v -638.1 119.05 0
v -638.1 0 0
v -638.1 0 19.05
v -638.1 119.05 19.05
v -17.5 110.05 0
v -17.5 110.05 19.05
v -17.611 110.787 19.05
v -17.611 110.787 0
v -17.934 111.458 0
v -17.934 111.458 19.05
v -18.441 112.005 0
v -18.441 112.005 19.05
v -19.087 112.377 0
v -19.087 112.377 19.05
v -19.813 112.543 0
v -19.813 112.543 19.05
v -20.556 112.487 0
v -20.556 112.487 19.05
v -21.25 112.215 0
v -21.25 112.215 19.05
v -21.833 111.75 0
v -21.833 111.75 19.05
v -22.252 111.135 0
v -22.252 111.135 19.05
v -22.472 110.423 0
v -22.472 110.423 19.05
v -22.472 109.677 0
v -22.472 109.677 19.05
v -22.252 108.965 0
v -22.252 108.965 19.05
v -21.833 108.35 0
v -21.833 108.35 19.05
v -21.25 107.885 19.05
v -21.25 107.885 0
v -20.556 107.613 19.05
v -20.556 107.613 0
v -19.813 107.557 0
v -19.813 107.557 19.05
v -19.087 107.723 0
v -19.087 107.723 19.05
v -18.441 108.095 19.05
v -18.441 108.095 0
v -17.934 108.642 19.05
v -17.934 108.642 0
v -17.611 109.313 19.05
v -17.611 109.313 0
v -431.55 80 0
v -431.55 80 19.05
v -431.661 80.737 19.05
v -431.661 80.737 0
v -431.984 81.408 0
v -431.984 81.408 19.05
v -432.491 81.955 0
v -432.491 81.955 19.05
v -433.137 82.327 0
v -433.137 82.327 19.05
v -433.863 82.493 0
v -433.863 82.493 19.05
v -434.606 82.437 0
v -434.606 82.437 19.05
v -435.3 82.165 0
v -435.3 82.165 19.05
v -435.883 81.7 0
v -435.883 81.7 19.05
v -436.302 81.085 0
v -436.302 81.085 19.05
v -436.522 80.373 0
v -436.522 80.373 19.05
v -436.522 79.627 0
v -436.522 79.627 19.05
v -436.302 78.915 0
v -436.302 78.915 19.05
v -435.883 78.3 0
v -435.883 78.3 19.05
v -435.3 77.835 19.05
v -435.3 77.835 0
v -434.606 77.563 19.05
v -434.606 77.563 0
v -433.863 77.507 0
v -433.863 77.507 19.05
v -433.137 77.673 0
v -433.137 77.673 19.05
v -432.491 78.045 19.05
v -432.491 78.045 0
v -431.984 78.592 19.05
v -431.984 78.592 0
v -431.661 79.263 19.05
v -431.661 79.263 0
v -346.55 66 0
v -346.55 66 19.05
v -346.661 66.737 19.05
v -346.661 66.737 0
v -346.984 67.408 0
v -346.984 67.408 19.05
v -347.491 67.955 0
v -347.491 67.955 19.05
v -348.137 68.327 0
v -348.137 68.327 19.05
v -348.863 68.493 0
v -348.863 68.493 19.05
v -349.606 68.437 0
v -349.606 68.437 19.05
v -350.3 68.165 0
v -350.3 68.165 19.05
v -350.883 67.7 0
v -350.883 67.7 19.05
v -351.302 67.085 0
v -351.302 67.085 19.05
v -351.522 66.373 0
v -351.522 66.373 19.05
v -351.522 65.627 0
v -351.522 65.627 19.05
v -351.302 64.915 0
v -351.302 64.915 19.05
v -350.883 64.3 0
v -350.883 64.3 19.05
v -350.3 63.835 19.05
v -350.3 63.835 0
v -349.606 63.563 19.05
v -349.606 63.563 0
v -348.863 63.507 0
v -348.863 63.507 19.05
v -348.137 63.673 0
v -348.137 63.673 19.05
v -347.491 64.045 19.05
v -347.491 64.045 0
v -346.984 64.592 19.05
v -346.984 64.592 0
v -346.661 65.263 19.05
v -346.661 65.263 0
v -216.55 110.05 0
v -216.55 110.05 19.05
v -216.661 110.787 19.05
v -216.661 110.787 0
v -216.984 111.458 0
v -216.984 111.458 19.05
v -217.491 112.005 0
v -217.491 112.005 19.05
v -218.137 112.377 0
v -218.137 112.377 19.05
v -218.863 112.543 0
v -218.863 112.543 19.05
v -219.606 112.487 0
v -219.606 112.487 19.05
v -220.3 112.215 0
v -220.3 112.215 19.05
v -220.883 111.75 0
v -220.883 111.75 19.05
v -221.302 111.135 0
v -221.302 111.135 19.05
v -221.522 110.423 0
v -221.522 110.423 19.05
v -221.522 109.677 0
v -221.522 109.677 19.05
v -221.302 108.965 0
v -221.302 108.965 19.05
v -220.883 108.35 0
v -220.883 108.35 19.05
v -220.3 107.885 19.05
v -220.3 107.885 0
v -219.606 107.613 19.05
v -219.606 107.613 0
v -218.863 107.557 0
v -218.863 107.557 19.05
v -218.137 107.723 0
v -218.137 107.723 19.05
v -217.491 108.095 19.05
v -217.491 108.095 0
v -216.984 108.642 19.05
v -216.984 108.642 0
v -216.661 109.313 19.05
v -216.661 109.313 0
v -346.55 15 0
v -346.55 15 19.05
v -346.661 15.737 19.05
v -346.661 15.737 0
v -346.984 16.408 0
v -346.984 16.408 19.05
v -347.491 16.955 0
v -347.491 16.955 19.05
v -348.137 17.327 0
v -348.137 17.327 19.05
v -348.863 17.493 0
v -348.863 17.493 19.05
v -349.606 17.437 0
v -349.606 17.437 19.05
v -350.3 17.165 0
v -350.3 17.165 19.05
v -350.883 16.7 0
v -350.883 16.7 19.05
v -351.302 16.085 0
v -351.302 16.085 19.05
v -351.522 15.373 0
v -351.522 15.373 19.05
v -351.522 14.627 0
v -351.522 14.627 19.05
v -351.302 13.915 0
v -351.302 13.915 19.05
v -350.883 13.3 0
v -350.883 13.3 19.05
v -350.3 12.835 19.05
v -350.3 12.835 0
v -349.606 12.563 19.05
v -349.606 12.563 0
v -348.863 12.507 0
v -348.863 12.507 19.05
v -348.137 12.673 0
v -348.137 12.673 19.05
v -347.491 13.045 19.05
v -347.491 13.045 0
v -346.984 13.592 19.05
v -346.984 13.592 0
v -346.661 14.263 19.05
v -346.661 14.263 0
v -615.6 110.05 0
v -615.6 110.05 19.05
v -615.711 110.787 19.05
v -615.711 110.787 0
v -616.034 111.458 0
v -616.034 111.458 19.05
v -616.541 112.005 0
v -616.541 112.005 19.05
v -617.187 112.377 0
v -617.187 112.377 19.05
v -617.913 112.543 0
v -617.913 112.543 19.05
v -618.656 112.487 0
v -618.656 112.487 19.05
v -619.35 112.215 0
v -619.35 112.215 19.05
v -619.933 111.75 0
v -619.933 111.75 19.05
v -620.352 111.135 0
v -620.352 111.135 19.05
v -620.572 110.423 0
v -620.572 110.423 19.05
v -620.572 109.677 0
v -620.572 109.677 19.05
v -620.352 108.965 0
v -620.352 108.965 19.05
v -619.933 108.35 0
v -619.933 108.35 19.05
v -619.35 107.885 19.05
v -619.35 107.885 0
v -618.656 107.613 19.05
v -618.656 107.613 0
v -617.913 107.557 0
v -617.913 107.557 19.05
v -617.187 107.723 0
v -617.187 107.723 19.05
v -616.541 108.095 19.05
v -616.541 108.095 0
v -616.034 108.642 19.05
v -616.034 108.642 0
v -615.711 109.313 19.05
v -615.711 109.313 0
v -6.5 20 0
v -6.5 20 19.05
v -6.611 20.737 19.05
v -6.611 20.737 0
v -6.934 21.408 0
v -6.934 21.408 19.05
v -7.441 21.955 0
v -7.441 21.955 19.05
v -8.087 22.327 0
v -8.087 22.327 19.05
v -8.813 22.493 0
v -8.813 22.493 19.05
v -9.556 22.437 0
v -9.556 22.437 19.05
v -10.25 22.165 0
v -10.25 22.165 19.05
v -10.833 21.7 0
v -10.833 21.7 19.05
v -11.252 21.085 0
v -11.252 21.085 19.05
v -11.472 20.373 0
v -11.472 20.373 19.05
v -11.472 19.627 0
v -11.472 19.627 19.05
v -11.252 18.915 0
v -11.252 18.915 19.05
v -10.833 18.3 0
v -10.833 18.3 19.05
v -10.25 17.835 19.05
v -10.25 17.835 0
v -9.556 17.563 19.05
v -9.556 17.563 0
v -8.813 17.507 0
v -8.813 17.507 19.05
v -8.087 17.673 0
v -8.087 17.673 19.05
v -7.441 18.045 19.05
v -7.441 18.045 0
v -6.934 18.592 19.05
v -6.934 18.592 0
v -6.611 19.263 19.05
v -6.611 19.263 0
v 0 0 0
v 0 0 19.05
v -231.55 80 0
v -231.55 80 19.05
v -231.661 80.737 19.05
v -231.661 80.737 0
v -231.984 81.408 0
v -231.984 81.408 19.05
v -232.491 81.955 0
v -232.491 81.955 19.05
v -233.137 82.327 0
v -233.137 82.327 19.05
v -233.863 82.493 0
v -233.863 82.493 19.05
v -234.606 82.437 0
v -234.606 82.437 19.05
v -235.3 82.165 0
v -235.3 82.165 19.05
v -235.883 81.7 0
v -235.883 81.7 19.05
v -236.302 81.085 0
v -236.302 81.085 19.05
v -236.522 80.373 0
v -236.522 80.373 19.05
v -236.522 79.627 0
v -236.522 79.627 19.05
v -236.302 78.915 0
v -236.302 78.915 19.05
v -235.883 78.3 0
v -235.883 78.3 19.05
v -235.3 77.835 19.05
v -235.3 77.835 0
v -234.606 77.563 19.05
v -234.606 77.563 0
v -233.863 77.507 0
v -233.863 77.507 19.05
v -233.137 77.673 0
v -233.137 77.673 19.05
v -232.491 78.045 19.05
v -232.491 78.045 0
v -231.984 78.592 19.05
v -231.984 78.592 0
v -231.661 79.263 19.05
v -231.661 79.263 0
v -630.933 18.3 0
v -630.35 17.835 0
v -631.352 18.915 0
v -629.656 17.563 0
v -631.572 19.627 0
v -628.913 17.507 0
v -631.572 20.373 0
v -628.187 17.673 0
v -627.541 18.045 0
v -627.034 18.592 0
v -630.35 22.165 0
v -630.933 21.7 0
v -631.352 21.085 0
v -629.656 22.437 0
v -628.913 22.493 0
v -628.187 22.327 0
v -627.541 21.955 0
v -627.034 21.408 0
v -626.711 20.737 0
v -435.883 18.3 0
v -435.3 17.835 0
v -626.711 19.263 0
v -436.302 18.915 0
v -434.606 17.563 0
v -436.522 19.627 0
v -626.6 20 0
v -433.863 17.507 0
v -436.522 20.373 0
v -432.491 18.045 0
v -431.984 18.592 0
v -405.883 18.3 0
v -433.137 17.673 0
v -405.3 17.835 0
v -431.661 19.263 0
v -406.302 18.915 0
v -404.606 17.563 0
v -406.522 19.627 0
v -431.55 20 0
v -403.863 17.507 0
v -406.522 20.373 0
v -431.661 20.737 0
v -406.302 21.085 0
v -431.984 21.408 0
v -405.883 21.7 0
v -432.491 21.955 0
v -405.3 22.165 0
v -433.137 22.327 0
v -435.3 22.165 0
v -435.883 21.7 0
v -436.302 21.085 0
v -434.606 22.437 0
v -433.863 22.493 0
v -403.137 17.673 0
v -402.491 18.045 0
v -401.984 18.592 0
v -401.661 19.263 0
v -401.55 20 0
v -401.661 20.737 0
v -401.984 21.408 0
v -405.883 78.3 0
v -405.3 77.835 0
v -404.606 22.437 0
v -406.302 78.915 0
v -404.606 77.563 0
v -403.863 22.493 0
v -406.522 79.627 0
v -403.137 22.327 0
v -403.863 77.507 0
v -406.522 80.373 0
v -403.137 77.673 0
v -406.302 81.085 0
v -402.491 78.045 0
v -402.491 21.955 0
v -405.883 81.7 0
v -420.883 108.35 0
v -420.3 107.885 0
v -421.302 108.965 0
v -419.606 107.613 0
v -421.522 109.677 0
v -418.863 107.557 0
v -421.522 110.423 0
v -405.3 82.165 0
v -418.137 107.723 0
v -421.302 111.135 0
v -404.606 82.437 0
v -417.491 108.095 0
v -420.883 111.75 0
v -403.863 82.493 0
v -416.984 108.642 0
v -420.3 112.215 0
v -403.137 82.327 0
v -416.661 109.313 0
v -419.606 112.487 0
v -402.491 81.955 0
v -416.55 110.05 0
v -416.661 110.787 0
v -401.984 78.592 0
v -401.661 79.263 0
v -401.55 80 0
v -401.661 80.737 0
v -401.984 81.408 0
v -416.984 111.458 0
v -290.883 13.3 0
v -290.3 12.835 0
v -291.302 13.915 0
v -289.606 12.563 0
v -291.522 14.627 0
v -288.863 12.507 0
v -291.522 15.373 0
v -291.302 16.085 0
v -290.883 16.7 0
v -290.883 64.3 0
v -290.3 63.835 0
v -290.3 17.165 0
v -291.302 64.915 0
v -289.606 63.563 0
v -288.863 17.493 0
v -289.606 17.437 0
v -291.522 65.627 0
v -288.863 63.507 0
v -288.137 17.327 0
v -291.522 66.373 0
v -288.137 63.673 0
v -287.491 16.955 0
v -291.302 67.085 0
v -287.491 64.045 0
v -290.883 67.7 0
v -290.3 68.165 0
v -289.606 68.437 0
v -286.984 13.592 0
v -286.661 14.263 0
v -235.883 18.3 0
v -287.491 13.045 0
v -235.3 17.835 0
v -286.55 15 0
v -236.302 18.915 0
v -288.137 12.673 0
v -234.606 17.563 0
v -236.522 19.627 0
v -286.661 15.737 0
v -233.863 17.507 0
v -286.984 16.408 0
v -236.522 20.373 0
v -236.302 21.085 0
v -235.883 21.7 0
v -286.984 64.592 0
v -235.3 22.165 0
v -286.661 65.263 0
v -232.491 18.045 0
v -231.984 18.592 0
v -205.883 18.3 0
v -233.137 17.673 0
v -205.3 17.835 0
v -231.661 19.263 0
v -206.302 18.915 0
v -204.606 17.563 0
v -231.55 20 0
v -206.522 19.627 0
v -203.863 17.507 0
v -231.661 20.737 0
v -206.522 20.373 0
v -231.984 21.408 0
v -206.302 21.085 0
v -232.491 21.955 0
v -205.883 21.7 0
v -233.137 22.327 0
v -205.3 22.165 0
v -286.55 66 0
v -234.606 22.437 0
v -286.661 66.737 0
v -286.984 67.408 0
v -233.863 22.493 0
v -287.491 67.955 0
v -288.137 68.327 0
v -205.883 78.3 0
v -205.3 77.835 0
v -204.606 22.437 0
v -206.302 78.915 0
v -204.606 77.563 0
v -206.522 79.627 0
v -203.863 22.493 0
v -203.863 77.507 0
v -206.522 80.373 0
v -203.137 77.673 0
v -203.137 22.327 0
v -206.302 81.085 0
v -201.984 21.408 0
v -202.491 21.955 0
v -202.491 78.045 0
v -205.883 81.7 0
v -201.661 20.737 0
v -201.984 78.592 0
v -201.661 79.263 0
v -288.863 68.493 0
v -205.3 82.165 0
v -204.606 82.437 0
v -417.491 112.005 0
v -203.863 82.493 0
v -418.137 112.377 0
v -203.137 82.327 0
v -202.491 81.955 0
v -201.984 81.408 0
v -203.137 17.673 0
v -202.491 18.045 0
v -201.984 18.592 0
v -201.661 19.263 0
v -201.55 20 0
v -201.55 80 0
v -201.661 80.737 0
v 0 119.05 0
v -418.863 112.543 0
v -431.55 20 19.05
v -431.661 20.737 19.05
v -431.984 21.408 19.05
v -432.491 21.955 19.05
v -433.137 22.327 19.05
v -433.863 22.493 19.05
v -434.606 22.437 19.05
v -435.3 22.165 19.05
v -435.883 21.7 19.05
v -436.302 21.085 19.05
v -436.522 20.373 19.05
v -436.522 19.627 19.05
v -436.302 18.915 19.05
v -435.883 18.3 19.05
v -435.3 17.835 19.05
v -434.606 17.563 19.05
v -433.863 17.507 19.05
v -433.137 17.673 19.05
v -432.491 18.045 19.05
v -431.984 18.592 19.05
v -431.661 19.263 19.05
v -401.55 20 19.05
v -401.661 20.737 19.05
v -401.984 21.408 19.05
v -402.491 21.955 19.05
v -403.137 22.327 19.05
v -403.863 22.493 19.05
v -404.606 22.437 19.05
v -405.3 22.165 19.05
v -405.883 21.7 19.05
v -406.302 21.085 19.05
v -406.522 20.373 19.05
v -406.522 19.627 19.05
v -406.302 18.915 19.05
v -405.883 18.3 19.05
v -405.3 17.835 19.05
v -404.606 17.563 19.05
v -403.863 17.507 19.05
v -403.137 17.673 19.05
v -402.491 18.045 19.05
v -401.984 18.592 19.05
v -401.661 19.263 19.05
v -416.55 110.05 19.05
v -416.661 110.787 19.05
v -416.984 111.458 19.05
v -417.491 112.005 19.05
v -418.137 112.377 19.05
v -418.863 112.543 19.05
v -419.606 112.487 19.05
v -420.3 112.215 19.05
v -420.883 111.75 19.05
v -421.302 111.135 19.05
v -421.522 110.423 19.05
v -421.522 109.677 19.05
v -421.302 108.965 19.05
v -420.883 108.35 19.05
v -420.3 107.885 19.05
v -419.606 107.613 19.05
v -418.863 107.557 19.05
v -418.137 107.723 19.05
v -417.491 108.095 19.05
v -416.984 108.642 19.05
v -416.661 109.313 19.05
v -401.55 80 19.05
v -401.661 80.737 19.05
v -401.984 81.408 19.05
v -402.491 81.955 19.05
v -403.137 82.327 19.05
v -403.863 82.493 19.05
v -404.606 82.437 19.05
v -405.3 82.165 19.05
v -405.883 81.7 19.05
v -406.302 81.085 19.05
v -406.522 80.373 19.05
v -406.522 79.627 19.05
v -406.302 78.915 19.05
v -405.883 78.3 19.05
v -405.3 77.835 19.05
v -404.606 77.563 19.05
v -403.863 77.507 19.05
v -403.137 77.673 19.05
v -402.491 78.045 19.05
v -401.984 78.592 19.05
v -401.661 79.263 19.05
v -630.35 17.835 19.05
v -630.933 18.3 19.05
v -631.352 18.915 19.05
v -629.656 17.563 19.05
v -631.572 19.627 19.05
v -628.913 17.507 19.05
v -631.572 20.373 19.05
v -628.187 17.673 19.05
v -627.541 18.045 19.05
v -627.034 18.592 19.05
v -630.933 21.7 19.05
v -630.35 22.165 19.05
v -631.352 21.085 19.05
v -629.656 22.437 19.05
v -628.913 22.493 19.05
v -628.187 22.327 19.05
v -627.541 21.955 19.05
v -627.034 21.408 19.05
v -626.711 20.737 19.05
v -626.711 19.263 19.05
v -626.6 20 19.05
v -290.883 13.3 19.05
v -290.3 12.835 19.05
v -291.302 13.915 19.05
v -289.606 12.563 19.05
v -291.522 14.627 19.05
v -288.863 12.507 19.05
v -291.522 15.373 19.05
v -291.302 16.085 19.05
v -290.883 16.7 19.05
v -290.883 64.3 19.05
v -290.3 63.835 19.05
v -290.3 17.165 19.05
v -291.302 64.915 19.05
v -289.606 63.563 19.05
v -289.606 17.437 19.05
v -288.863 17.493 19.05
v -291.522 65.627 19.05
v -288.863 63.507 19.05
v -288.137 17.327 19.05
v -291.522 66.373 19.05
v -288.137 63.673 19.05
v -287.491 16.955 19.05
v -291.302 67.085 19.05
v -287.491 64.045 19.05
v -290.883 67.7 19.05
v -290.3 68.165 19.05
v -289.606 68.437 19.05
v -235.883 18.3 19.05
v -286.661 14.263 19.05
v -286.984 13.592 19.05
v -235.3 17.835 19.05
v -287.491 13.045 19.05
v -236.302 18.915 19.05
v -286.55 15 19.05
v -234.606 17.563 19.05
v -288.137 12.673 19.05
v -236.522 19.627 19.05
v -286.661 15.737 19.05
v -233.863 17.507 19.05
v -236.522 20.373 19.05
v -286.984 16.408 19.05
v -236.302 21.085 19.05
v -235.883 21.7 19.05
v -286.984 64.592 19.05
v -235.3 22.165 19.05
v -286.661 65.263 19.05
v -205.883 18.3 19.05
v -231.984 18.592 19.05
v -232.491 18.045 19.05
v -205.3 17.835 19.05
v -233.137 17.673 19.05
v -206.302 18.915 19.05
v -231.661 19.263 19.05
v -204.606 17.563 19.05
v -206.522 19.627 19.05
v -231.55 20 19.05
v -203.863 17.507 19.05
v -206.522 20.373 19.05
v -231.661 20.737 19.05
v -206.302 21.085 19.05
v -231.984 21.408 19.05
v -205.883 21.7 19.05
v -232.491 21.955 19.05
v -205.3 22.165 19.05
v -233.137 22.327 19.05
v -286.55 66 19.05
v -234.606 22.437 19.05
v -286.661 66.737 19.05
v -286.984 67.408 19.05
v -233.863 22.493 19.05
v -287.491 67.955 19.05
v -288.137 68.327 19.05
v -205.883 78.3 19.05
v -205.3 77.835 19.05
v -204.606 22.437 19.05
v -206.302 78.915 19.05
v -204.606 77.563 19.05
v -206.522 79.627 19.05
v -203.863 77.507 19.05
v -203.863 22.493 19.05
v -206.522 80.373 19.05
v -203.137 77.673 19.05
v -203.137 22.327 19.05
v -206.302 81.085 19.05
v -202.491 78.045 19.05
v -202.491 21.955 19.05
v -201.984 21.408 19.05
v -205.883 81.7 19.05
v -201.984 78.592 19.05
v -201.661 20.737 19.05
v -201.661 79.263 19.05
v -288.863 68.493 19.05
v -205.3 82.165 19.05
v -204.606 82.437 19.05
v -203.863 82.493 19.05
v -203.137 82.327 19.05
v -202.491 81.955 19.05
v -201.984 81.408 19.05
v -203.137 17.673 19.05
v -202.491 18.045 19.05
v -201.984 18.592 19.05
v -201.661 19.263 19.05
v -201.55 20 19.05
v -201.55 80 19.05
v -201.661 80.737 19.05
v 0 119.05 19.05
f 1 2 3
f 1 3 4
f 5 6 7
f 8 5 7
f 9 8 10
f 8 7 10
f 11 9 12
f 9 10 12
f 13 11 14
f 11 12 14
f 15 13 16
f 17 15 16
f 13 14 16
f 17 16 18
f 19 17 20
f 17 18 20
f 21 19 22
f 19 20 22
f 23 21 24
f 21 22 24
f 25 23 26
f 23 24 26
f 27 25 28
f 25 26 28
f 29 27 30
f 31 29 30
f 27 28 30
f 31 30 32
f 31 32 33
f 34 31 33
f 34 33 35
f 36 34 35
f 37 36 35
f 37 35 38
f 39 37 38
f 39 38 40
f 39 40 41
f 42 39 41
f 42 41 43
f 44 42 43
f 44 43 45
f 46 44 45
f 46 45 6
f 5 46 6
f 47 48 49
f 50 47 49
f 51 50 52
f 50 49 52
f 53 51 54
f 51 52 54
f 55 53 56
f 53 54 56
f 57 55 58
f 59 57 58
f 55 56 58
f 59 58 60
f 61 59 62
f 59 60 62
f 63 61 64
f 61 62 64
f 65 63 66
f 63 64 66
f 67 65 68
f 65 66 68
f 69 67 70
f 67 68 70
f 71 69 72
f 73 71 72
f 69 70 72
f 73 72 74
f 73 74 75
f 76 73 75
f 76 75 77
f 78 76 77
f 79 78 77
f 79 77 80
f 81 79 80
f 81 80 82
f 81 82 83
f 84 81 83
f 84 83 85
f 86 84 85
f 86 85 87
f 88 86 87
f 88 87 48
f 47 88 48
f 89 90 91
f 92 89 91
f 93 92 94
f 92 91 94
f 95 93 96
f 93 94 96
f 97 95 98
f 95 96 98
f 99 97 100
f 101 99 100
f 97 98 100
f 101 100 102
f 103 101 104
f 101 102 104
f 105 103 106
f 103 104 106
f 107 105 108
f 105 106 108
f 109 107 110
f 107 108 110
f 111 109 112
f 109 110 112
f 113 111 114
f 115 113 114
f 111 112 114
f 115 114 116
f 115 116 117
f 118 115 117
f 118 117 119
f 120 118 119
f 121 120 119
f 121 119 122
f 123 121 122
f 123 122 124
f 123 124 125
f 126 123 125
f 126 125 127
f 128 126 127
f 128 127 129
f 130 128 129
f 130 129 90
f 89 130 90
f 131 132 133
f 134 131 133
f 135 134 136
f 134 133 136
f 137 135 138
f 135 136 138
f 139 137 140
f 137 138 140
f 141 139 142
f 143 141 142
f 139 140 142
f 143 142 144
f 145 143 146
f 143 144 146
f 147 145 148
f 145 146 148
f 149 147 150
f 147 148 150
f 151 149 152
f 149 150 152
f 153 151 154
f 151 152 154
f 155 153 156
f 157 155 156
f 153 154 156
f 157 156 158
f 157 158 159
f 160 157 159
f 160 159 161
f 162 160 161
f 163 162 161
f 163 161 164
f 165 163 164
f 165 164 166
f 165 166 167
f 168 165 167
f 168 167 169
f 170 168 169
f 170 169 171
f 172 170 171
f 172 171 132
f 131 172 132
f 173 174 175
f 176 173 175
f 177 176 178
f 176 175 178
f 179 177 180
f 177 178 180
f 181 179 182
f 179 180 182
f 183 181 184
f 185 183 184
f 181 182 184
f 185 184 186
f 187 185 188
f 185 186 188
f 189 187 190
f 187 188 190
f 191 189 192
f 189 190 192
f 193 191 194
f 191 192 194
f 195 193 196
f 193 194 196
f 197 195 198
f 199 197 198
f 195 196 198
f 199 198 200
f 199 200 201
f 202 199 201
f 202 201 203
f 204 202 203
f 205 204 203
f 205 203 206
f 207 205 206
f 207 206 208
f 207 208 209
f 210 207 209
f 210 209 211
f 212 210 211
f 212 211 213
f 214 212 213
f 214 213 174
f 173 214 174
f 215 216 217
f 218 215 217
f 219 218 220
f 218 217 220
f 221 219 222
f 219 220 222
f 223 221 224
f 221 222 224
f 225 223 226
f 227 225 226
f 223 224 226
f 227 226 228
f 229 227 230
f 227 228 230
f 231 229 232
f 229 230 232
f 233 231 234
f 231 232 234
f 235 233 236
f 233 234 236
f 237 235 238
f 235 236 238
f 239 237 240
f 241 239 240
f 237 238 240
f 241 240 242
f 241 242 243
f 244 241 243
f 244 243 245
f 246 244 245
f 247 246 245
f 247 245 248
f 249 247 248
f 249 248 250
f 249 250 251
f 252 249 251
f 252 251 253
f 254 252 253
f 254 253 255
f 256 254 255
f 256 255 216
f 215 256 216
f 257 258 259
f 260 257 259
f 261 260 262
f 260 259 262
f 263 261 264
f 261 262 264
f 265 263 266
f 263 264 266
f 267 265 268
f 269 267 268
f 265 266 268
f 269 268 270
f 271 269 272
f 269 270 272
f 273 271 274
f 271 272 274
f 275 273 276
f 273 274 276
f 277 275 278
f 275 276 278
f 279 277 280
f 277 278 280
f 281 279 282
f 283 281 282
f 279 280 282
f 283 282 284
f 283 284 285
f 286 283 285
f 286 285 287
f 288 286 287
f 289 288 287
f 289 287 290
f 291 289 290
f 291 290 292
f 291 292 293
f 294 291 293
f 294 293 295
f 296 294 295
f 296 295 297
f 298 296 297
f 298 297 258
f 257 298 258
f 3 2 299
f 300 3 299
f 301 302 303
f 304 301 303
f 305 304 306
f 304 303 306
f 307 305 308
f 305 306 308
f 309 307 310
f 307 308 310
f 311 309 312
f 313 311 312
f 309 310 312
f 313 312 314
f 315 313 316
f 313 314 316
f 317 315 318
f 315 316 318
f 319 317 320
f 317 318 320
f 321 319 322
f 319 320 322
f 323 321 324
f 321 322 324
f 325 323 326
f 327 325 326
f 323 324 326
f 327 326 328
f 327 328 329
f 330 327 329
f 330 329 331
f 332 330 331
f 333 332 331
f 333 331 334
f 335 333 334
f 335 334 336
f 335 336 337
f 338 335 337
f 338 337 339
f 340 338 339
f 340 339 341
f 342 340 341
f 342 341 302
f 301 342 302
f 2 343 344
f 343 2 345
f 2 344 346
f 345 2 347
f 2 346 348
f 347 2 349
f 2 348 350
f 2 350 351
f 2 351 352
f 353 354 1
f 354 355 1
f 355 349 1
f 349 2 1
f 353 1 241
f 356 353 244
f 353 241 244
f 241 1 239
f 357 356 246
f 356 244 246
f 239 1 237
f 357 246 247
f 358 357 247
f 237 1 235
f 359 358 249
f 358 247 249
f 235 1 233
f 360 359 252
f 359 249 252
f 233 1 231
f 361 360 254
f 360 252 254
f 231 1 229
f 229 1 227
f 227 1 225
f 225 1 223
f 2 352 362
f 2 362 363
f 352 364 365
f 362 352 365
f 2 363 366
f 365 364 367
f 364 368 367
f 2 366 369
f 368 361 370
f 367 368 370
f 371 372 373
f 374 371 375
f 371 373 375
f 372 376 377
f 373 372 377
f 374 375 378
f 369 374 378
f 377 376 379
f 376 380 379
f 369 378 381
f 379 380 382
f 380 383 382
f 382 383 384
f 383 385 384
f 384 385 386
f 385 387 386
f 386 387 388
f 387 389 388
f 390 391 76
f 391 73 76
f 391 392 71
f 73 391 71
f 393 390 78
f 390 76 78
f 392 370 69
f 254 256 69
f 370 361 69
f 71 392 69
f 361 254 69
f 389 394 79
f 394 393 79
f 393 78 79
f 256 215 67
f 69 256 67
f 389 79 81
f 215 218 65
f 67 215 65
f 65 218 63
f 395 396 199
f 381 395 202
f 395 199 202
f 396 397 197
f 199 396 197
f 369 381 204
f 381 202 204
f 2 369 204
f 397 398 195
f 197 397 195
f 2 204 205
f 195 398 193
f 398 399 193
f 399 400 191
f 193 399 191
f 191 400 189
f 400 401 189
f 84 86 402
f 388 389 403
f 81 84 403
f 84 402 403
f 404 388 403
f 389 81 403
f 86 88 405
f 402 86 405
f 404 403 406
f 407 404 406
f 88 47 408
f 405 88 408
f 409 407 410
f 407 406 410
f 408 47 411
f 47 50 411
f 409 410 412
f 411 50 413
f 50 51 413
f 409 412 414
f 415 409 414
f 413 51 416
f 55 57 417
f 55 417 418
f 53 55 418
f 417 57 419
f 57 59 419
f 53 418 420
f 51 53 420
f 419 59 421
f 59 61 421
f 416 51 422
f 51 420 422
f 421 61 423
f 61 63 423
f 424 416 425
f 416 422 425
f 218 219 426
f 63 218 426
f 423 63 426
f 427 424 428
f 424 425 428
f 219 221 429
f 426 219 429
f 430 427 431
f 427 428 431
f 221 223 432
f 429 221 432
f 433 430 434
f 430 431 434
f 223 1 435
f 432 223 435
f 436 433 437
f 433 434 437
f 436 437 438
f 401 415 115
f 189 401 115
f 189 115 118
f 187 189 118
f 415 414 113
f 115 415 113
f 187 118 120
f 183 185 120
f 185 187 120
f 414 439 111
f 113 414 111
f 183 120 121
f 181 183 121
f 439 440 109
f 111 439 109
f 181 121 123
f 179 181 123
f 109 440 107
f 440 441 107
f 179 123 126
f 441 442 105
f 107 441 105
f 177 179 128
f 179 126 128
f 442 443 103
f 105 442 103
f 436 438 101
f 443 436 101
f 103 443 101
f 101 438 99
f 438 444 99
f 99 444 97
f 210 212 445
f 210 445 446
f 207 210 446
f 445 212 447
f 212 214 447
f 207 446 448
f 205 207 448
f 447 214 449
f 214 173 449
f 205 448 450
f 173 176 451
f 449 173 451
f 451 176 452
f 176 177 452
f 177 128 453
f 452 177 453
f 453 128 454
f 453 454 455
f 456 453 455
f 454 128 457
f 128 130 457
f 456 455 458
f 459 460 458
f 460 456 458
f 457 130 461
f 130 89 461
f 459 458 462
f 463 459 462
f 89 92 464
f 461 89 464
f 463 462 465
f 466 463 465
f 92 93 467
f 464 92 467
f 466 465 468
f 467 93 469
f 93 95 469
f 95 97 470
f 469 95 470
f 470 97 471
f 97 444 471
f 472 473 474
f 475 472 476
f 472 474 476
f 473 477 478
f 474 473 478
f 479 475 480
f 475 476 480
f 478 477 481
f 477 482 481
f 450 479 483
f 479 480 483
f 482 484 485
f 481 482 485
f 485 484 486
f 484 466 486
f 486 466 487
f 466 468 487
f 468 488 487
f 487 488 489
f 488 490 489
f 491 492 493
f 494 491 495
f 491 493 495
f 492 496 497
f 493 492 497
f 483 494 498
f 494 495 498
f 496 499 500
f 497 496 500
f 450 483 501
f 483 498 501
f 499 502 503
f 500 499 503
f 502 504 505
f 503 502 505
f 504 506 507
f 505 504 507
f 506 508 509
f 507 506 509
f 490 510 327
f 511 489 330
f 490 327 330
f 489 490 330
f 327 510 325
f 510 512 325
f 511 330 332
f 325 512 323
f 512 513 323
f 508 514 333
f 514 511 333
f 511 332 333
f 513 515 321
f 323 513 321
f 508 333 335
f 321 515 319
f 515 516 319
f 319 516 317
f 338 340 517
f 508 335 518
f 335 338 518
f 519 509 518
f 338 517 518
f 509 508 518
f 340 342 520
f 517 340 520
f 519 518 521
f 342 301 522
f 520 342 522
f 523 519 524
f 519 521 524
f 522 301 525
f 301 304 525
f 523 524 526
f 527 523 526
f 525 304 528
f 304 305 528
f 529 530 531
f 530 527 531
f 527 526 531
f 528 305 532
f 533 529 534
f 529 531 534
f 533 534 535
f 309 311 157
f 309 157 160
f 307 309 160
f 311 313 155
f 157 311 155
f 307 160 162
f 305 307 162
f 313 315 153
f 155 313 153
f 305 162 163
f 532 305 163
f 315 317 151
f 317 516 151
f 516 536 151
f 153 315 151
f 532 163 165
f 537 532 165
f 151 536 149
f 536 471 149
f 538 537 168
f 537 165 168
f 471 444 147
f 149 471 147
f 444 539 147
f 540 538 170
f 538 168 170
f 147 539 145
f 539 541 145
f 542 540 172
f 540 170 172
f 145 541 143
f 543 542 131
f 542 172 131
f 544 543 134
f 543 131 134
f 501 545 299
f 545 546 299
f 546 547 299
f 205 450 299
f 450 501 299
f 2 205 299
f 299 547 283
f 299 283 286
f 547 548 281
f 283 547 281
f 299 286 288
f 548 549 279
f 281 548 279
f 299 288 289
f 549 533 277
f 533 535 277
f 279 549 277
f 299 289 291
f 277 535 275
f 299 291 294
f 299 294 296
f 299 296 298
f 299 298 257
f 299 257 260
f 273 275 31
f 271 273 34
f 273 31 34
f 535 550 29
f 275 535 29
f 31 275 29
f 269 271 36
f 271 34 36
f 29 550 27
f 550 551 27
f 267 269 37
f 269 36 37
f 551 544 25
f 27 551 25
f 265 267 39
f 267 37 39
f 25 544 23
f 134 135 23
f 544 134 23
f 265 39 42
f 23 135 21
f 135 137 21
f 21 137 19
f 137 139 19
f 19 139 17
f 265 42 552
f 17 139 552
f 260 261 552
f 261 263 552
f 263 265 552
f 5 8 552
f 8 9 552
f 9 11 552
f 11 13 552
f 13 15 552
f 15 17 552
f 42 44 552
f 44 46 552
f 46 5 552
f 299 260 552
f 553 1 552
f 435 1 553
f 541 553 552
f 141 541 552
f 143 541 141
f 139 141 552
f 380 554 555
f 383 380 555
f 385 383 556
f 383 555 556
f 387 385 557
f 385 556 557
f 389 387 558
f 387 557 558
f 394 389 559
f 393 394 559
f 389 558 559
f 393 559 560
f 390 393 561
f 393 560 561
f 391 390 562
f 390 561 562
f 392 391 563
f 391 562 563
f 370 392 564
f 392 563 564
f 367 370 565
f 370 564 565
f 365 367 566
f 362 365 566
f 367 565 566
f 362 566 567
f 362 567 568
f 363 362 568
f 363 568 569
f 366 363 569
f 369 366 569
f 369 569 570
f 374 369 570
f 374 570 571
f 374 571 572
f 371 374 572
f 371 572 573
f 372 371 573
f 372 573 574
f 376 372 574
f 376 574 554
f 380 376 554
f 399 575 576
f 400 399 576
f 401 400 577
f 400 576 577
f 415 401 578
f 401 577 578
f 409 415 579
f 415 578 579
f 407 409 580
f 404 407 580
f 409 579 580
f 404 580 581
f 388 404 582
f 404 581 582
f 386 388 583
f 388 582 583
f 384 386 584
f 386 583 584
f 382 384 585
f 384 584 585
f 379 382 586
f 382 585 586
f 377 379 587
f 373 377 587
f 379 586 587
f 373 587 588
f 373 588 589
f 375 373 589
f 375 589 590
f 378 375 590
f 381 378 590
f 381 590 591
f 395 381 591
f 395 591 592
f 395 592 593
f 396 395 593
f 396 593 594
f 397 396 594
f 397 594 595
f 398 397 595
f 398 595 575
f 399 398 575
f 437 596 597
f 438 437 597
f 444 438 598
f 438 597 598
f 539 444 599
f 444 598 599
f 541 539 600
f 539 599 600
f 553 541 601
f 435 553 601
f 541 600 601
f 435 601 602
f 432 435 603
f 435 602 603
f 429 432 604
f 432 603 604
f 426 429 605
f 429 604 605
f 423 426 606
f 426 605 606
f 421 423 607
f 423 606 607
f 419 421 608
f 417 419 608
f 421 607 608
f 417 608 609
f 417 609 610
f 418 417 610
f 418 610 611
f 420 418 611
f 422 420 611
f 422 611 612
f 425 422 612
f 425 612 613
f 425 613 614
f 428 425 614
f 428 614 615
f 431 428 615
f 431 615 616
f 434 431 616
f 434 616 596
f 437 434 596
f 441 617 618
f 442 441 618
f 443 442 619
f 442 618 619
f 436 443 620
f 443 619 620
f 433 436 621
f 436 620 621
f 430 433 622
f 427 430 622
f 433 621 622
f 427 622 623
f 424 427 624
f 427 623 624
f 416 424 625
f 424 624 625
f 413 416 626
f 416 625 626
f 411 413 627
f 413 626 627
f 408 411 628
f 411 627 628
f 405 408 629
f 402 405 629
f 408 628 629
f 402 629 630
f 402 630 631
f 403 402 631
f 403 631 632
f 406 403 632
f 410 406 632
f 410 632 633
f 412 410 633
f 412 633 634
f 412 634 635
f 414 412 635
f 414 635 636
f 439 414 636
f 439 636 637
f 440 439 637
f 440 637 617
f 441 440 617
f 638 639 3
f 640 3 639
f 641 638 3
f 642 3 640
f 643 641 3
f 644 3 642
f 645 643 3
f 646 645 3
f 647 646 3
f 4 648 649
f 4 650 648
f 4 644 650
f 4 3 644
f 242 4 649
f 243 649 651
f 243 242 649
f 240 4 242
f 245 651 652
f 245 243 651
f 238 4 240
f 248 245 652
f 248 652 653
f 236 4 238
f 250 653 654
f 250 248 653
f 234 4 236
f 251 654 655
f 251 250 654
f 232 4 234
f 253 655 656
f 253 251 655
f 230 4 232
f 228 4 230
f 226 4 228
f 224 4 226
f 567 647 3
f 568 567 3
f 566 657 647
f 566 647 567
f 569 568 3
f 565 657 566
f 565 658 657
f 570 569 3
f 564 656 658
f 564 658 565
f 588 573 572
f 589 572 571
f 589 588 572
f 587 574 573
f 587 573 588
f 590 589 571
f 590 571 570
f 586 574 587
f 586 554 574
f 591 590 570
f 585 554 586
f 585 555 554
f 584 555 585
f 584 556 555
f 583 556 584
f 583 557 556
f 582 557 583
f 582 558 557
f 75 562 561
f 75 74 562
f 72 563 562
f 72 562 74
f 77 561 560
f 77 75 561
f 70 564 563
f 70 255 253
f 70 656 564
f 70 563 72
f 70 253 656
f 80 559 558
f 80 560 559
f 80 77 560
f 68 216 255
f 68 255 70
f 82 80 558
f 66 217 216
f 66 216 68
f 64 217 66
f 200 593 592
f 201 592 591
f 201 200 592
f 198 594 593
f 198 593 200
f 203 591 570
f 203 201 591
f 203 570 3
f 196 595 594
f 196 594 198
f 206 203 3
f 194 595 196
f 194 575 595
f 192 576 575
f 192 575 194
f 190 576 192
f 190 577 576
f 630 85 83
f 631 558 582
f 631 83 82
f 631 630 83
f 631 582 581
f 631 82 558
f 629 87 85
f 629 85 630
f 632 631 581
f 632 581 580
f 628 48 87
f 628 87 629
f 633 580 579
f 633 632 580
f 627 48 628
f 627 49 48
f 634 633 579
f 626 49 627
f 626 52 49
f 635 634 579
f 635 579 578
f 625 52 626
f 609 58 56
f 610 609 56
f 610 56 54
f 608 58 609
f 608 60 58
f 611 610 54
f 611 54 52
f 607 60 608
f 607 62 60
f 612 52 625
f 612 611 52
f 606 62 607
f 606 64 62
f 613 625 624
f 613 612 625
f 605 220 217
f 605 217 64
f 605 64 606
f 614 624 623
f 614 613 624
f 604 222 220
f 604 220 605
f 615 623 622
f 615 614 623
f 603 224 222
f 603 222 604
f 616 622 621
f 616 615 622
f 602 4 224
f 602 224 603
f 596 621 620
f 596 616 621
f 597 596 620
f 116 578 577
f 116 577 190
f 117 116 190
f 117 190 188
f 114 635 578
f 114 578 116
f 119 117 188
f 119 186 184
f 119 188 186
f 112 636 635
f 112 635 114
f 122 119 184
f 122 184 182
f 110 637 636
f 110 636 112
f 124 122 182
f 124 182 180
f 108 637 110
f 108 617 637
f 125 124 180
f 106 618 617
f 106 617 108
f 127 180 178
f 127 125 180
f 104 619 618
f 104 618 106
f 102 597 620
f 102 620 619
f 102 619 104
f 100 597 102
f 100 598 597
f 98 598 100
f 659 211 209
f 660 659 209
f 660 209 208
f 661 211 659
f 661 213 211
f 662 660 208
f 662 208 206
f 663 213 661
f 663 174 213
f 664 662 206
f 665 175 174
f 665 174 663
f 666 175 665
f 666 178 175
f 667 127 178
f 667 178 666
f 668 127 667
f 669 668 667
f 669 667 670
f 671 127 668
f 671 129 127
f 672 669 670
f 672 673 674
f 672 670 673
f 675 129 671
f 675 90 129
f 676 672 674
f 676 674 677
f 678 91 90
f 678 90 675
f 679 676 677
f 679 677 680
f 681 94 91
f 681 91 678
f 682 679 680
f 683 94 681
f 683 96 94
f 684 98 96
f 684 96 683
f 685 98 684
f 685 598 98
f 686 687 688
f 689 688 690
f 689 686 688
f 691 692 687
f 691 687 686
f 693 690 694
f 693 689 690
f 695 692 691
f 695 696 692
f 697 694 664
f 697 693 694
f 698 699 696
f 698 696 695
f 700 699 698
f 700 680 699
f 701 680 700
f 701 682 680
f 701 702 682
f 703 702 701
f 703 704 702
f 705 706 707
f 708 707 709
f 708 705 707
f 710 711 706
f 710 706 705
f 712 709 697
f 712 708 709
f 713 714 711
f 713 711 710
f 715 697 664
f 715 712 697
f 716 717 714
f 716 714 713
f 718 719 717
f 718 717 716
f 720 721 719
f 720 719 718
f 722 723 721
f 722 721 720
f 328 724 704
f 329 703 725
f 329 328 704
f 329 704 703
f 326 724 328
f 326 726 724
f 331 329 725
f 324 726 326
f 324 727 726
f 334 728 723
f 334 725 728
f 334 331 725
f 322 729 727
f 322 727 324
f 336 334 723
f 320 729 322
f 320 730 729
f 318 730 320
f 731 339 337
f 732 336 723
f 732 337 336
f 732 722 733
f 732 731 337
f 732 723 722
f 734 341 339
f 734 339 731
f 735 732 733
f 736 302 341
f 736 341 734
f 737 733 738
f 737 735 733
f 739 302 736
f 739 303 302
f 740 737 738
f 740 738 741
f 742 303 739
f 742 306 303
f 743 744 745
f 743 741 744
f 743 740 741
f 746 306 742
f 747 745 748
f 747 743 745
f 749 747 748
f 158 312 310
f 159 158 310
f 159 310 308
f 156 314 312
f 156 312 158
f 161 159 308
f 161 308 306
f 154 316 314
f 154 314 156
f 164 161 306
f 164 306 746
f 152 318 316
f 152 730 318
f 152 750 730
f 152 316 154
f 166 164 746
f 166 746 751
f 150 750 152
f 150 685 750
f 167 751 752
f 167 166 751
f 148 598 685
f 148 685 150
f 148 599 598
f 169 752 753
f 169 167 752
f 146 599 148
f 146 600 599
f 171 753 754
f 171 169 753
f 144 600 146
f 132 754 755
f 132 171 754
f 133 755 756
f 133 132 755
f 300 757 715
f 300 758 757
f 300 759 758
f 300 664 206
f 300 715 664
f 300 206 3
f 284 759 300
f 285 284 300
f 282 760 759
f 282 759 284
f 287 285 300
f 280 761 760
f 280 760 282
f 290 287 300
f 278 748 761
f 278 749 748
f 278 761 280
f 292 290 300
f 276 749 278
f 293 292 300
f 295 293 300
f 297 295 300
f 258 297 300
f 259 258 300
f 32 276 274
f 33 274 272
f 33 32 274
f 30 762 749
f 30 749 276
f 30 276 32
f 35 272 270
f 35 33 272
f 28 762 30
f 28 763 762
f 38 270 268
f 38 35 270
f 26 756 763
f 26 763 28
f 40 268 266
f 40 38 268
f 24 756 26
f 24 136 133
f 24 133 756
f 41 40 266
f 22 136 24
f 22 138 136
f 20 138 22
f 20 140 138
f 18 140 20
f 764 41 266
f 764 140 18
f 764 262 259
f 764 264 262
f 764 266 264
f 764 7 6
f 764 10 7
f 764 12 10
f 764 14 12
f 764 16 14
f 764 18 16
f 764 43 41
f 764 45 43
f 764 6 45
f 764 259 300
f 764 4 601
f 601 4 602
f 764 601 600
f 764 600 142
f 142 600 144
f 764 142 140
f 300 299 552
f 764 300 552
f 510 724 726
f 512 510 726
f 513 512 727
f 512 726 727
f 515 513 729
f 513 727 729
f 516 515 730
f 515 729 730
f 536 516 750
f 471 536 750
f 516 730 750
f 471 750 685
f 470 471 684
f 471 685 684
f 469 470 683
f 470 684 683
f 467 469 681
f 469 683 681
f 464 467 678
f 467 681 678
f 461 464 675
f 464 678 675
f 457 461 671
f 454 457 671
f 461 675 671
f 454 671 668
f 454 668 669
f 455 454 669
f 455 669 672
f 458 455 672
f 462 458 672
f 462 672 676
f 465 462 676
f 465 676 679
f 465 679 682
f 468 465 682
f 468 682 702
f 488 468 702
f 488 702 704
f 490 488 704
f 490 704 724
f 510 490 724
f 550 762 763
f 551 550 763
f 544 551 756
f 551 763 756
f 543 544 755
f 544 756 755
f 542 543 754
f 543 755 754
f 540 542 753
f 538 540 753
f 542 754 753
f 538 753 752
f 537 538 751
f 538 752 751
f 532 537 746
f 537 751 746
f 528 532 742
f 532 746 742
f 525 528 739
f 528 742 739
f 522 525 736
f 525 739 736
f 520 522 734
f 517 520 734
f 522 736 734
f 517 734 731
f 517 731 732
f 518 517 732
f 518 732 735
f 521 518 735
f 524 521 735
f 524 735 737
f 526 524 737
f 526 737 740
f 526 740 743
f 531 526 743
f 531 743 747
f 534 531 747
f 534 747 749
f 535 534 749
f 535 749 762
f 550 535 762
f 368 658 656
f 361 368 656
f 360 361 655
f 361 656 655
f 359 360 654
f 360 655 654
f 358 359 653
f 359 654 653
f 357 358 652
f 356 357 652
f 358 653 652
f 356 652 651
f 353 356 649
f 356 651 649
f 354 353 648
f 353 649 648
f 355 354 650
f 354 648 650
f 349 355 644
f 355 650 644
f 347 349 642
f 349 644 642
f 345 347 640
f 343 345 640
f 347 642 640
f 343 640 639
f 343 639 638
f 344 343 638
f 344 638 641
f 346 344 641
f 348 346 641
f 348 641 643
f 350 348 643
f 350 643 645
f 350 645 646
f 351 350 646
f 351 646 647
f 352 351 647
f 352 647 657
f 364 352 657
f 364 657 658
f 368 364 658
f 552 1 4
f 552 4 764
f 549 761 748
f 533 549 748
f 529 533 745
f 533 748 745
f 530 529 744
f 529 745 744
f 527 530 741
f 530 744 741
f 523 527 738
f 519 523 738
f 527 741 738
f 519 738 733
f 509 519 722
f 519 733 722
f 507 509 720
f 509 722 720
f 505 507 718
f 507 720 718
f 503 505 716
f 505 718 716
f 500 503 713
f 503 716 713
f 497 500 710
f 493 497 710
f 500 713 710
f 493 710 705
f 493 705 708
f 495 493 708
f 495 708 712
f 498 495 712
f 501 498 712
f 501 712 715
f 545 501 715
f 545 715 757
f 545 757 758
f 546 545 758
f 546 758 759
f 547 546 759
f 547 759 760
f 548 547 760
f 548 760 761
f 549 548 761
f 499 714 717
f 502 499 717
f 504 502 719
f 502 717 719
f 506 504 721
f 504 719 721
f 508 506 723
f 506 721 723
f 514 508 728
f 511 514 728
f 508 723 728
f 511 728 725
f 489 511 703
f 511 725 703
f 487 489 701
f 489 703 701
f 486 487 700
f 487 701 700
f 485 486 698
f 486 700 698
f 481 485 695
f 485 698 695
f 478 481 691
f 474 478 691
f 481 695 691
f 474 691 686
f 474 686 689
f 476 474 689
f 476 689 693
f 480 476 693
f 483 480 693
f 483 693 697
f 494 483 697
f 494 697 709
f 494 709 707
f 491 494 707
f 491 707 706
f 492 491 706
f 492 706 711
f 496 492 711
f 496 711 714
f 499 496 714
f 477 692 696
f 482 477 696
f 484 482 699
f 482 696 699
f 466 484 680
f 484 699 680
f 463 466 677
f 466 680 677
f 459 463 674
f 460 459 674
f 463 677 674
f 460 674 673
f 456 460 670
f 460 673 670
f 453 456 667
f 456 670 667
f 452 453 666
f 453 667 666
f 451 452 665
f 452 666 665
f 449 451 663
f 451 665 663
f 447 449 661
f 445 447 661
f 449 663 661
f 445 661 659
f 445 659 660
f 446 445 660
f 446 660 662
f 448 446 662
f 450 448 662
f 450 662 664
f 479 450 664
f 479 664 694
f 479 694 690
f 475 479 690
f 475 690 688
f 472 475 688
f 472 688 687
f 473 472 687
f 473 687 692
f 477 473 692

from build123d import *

# Parameters (mm, degrees)
SKETCH1_W                 = 638.1
SKETCH1_H                 = 119.05
BOSS_EXTRUDE1_DEPTH       = 19.05
F_5_0MM_DOWEL_HOLE1_D     = 5
F_5_0MM_DOWEL_HOLE1_DEPTH = 28.497848452
F_5_0MM_DOWEL_HOLE1_TIP   = 1.502151548


with BuildPart() as part:
    # Sketch1 → Boss-Extrude1 (new body)
    with BuildSketch(Plane.XY):
        with Locations((-319.05, 59.525)):
            Rectangle(SKETCH1_W, SKETCH1_H)
    extrude(amount=BOSS_EXTRUDE1_DEPTH)

    # Ø5.0mm Dowel Hole1
    with Locations(Plane(origin=(0, 0, 0), x_dir=(-1, 0, 0), z_dir=(0, 0, -1))):
        with Locations((434.05, 20), (404.05, 20), (404.05, 80), (434.05, 80), (349.05, 15), (349.05, 66), (289.05, 66), (289.05, 15), (234.05, 20), (234.05, 80), (204.05, 80), (204.05, 20), (629.1, 20), (618.1, 110.05), (419.05, 110.05), (219.05, 110.05), (20, 110.05), (9, 20)):
            Hole(F_5_0MM_DOWEL_HOLE1_D / 2, depth=F_5_0MM_DOWEL_HOLE1_DEPTH)
            with Locations((0, 0, -(F_5_0MM_DOWEL_HOLE1_DEPTH + F_5_0MM_DOWEL_HOLE1_TIP / 2))):  # 118° drill point
                Cone(0, F_5_0MM_DOWEL_HOLE1_D / 2, F_5_0MM_DOWEL_HOLE1_TIP, mode=Mode.SUBTRACT)


solid = part.part
